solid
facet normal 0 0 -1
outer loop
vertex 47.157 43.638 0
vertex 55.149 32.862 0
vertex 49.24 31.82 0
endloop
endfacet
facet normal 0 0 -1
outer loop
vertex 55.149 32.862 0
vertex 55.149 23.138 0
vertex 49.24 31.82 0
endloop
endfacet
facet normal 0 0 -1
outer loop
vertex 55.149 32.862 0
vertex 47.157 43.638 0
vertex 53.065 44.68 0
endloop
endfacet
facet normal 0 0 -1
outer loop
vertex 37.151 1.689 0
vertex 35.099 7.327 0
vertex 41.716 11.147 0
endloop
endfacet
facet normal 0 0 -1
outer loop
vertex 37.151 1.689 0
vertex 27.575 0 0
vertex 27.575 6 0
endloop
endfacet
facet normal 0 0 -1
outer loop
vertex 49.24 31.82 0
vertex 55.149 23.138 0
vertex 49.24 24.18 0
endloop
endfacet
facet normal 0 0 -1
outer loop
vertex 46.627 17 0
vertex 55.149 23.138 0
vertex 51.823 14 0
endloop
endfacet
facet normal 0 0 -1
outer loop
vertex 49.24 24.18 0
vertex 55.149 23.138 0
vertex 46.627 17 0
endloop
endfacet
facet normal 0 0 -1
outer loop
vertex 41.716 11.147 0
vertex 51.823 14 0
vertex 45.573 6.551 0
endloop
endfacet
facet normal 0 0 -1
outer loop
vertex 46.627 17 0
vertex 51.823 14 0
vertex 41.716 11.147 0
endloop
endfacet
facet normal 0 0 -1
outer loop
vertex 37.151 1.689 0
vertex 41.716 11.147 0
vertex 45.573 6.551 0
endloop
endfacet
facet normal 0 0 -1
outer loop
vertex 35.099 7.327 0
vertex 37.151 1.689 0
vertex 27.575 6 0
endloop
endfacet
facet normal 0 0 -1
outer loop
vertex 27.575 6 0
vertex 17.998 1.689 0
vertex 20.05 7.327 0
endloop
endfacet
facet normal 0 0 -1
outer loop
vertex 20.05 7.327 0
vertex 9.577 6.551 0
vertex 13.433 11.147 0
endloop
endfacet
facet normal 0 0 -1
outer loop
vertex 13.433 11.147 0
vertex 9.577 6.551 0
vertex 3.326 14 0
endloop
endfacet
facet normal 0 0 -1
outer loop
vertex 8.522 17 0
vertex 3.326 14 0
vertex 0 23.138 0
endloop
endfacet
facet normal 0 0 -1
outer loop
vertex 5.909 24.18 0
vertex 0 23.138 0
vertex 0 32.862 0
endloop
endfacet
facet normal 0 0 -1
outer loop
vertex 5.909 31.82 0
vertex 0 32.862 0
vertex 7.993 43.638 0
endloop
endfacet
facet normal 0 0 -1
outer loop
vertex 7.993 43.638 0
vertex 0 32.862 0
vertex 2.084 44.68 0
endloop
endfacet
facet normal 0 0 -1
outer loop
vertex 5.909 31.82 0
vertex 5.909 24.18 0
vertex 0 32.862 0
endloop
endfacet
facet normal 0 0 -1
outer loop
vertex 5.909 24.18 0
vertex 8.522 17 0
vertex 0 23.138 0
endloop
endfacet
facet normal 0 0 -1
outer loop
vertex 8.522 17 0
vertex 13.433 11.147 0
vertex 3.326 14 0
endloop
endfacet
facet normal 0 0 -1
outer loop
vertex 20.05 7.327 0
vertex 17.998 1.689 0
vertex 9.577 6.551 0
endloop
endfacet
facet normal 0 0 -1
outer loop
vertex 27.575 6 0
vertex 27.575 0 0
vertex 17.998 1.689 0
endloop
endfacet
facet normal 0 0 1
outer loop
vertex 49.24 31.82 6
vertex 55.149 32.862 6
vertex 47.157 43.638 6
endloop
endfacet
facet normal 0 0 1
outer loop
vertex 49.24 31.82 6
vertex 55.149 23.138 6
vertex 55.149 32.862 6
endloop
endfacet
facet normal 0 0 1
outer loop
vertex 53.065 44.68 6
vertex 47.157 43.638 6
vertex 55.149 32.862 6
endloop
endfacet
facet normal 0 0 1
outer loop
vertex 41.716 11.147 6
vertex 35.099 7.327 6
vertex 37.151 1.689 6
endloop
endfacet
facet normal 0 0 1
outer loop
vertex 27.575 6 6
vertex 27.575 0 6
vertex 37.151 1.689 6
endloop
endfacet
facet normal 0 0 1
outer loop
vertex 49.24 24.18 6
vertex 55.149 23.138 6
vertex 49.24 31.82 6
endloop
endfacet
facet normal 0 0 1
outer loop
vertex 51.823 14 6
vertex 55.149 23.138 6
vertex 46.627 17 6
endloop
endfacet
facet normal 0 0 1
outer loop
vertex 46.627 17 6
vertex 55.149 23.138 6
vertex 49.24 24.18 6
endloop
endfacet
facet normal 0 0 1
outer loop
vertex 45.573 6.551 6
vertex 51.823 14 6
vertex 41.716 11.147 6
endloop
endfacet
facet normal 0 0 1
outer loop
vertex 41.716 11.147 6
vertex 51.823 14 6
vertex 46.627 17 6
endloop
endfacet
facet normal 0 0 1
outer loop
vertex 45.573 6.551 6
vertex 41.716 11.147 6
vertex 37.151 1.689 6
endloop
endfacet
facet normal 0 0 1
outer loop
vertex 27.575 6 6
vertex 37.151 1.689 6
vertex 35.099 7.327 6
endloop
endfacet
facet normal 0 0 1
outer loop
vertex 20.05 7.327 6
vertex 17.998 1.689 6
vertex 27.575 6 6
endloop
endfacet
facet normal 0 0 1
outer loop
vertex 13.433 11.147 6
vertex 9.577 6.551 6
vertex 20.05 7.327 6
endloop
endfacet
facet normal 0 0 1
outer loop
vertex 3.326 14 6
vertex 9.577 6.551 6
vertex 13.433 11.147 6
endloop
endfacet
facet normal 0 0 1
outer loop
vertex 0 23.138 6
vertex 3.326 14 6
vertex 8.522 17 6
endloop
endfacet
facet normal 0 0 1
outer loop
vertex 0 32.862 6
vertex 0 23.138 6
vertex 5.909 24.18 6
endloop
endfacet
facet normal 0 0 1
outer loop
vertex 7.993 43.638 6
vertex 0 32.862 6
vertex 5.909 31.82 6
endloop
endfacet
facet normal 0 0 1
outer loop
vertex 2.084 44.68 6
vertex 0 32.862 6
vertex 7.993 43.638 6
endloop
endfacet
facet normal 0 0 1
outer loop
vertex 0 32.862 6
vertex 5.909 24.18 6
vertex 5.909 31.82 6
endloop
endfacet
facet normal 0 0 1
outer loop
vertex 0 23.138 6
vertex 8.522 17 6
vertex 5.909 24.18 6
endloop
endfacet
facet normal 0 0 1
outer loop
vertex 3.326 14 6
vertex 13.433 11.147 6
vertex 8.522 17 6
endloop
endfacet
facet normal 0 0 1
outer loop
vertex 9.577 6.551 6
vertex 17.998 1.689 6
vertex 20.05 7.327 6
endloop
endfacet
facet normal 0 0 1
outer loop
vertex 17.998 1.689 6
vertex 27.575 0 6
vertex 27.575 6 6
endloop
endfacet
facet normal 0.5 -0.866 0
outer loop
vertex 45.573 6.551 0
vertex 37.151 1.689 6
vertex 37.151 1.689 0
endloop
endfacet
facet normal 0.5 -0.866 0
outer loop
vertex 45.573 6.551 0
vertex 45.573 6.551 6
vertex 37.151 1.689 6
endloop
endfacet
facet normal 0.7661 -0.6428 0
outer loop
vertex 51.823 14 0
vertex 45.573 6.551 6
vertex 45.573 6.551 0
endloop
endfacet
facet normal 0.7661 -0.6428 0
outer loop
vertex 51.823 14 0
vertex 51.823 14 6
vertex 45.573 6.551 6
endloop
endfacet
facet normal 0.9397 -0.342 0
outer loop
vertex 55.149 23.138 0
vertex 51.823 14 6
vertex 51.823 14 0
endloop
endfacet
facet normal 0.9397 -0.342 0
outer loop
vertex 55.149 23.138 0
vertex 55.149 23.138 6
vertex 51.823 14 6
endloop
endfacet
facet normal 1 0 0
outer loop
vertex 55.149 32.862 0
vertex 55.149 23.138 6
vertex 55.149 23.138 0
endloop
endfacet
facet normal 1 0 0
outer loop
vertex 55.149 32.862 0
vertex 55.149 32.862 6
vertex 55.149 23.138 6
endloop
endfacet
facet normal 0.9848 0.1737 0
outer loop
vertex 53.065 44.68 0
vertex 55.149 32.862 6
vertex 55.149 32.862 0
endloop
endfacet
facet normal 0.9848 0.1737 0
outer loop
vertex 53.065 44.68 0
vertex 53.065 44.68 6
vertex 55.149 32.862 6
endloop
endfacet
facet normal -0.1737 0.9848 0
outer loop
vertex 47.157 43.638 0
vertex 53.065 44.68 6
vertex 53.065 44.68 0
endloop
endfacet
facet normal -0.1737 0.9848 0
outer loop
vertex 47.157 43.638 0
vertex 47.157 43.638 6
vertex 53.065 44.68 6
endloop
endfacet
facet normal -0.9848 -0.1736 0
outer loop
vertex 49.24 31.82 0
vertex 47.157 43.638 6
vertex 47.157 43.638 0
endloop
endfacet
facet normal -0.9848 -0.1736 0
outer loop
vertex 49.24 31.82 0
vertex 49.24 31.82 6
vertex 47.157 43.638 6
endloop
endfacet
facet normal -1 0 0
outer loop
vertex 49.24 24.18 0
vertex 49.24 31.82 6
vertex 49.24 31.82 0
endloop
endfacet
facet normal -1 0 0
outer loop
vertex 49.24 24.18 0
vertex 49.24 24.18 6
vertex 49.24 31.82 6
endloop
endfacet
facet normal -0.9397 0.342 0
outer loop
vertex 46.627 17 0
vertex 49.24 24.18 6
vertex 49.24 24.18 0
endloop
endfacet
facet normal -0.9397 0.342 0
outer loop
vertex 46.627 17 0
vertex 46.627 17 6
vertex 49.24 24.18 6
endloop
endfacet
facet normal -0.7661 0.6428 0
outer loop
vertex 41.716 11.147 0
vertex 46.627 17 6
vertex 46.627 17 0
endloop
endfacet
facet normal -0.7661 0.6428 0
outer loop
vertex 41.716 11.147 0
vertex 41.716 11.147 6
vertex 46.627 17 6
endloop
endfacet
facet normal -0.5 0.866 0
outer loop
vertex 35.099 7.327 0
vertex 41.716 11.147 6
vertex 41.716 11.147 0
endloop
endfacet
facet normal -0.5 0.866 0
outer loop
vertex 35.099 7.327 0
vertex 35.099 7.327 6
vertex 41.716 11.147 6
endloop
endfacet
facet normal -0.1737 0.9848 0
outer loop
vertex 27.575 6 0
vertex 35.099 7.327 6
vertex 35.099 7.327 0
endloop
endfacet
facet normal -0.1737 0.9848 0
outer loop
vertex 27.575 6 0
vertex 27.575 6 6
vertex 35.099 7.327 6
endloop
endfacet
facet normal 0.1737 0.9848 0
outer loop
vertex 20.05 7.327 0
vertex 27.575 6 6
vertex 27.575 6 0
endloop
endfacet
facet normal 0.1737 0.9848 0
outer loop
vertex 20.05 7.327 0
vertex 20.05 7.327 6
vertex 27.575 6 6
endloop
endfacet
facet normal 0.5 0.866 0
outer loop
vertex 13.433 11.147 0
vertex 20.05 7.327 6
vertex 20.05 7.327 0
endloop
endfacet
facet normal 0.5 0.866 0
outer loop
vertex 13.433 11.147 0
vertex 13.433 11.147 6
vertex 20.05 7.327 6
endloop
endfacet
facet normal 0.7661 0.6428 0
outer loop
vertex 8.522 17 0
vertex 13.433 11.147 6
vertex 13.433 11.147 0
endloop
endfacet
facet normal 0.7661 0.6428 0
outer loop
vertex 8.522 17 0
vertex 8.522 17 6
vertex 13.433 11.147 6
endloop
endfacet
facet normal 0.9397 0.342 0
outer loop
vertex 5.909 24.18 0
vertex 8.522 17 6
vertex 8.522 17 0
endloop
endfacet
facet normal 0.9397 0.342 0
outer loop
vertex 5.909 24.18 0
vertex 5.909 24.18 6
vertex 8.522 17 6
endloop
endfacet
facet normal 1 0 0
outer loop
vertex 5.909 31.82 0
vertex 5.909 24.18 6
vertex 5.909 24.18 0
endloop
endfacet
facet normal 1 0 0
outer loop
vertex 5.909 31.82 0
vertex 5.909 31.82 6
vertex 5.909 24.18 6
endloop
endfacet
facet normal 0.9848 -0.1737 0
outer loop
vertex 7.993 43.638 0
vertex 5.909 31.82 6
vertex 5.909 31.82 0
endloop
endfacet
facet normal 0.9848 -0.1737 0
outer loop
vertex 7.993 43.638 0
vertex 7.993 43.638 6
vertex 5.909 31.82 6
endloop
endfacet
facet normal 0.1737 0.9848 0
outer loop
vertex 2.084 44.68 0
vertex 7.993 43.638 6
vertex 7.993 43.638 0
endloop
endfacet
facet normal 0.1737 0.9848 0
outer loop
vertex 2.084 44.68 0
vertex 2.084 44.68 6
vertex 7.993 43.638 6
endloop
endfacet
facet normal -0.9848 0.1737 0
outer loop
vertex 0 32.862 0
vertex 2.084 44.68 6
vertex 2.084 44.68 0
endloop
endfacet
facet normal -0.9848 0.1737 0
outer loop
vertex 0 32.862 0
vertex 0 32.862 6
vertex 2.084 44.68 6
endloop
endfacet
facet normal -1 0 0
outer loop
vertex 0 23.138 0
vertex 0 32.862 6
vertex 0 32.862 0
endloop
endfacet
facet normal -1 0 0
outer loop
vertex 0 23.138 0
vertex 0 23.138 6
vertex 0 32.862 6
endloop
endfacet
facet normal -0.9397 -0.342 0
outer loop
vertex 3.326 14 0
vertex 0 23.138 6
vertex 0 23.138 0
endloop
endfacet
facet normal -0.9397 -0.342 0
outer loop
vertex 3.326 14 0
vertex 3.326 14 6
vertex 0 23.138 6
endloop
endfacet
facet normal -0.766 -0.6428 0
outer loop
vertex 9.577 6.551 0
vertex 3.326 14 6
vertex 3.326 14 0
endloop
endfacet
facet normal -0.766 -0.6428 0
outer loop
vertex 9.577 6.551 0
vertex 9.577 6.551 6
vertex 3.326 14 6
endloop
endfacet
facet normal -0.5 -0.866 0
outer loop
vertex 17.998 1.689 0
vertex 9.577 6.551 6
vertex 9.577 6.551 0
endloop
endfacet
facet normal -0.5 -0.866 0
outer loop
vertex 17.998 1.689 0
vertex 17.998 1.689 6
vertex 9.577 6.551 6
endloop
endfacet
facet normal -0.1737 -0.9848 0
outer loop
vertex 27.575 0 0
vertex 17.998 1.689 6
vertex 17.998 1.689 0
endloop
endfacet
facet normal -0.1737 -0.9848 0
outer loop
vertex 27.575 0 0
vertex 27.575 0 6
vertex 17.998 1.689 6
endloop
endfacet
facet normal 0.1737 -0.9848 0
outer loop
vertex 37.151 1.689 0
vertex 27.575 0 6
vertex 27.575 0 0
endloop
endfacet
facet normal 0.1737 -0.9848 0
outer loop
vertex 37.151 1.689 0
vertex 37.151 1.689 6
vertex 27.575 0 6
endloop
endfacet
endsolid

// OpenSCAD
$fn = 32;

// ----------------------------------------------------------------------
// Clip blank: omega clip, 6 mm thick
// ----------------------------------------------------------------------

// --- parameters (mm) ---
profile_height = 6;       // extrusion height
profile_points = 26;      // points of the closed outline

profile = [[0, 32.862], [0, 23.138], [3.326, 14], [9.577, 6.551], [17.998, 1.689], [27.575, 0], [37.151, 1.689], [45.573, 6.551], [51.823, 14], [55.149, 23.138], [55.149, 32.862], [53.065, 44.68], [47.157, 43.638], [49.24, 31.82], [49.24, 24.18], [46.627, 17], [41.716, 11.147], [35.099, 7.327], [27.575, 6], [20.05, 7.327], [13.433, 11.147], [8.522, 17], [5.909, 24.18], [5.909, 31.82], [7.993, 43.638], [2.084, 44.68]];  // single closed polygon, 26 points, counter clockwise

// --- the one profile operation ---
linear_extrude(height = profile_height) polygon(points = profile);
